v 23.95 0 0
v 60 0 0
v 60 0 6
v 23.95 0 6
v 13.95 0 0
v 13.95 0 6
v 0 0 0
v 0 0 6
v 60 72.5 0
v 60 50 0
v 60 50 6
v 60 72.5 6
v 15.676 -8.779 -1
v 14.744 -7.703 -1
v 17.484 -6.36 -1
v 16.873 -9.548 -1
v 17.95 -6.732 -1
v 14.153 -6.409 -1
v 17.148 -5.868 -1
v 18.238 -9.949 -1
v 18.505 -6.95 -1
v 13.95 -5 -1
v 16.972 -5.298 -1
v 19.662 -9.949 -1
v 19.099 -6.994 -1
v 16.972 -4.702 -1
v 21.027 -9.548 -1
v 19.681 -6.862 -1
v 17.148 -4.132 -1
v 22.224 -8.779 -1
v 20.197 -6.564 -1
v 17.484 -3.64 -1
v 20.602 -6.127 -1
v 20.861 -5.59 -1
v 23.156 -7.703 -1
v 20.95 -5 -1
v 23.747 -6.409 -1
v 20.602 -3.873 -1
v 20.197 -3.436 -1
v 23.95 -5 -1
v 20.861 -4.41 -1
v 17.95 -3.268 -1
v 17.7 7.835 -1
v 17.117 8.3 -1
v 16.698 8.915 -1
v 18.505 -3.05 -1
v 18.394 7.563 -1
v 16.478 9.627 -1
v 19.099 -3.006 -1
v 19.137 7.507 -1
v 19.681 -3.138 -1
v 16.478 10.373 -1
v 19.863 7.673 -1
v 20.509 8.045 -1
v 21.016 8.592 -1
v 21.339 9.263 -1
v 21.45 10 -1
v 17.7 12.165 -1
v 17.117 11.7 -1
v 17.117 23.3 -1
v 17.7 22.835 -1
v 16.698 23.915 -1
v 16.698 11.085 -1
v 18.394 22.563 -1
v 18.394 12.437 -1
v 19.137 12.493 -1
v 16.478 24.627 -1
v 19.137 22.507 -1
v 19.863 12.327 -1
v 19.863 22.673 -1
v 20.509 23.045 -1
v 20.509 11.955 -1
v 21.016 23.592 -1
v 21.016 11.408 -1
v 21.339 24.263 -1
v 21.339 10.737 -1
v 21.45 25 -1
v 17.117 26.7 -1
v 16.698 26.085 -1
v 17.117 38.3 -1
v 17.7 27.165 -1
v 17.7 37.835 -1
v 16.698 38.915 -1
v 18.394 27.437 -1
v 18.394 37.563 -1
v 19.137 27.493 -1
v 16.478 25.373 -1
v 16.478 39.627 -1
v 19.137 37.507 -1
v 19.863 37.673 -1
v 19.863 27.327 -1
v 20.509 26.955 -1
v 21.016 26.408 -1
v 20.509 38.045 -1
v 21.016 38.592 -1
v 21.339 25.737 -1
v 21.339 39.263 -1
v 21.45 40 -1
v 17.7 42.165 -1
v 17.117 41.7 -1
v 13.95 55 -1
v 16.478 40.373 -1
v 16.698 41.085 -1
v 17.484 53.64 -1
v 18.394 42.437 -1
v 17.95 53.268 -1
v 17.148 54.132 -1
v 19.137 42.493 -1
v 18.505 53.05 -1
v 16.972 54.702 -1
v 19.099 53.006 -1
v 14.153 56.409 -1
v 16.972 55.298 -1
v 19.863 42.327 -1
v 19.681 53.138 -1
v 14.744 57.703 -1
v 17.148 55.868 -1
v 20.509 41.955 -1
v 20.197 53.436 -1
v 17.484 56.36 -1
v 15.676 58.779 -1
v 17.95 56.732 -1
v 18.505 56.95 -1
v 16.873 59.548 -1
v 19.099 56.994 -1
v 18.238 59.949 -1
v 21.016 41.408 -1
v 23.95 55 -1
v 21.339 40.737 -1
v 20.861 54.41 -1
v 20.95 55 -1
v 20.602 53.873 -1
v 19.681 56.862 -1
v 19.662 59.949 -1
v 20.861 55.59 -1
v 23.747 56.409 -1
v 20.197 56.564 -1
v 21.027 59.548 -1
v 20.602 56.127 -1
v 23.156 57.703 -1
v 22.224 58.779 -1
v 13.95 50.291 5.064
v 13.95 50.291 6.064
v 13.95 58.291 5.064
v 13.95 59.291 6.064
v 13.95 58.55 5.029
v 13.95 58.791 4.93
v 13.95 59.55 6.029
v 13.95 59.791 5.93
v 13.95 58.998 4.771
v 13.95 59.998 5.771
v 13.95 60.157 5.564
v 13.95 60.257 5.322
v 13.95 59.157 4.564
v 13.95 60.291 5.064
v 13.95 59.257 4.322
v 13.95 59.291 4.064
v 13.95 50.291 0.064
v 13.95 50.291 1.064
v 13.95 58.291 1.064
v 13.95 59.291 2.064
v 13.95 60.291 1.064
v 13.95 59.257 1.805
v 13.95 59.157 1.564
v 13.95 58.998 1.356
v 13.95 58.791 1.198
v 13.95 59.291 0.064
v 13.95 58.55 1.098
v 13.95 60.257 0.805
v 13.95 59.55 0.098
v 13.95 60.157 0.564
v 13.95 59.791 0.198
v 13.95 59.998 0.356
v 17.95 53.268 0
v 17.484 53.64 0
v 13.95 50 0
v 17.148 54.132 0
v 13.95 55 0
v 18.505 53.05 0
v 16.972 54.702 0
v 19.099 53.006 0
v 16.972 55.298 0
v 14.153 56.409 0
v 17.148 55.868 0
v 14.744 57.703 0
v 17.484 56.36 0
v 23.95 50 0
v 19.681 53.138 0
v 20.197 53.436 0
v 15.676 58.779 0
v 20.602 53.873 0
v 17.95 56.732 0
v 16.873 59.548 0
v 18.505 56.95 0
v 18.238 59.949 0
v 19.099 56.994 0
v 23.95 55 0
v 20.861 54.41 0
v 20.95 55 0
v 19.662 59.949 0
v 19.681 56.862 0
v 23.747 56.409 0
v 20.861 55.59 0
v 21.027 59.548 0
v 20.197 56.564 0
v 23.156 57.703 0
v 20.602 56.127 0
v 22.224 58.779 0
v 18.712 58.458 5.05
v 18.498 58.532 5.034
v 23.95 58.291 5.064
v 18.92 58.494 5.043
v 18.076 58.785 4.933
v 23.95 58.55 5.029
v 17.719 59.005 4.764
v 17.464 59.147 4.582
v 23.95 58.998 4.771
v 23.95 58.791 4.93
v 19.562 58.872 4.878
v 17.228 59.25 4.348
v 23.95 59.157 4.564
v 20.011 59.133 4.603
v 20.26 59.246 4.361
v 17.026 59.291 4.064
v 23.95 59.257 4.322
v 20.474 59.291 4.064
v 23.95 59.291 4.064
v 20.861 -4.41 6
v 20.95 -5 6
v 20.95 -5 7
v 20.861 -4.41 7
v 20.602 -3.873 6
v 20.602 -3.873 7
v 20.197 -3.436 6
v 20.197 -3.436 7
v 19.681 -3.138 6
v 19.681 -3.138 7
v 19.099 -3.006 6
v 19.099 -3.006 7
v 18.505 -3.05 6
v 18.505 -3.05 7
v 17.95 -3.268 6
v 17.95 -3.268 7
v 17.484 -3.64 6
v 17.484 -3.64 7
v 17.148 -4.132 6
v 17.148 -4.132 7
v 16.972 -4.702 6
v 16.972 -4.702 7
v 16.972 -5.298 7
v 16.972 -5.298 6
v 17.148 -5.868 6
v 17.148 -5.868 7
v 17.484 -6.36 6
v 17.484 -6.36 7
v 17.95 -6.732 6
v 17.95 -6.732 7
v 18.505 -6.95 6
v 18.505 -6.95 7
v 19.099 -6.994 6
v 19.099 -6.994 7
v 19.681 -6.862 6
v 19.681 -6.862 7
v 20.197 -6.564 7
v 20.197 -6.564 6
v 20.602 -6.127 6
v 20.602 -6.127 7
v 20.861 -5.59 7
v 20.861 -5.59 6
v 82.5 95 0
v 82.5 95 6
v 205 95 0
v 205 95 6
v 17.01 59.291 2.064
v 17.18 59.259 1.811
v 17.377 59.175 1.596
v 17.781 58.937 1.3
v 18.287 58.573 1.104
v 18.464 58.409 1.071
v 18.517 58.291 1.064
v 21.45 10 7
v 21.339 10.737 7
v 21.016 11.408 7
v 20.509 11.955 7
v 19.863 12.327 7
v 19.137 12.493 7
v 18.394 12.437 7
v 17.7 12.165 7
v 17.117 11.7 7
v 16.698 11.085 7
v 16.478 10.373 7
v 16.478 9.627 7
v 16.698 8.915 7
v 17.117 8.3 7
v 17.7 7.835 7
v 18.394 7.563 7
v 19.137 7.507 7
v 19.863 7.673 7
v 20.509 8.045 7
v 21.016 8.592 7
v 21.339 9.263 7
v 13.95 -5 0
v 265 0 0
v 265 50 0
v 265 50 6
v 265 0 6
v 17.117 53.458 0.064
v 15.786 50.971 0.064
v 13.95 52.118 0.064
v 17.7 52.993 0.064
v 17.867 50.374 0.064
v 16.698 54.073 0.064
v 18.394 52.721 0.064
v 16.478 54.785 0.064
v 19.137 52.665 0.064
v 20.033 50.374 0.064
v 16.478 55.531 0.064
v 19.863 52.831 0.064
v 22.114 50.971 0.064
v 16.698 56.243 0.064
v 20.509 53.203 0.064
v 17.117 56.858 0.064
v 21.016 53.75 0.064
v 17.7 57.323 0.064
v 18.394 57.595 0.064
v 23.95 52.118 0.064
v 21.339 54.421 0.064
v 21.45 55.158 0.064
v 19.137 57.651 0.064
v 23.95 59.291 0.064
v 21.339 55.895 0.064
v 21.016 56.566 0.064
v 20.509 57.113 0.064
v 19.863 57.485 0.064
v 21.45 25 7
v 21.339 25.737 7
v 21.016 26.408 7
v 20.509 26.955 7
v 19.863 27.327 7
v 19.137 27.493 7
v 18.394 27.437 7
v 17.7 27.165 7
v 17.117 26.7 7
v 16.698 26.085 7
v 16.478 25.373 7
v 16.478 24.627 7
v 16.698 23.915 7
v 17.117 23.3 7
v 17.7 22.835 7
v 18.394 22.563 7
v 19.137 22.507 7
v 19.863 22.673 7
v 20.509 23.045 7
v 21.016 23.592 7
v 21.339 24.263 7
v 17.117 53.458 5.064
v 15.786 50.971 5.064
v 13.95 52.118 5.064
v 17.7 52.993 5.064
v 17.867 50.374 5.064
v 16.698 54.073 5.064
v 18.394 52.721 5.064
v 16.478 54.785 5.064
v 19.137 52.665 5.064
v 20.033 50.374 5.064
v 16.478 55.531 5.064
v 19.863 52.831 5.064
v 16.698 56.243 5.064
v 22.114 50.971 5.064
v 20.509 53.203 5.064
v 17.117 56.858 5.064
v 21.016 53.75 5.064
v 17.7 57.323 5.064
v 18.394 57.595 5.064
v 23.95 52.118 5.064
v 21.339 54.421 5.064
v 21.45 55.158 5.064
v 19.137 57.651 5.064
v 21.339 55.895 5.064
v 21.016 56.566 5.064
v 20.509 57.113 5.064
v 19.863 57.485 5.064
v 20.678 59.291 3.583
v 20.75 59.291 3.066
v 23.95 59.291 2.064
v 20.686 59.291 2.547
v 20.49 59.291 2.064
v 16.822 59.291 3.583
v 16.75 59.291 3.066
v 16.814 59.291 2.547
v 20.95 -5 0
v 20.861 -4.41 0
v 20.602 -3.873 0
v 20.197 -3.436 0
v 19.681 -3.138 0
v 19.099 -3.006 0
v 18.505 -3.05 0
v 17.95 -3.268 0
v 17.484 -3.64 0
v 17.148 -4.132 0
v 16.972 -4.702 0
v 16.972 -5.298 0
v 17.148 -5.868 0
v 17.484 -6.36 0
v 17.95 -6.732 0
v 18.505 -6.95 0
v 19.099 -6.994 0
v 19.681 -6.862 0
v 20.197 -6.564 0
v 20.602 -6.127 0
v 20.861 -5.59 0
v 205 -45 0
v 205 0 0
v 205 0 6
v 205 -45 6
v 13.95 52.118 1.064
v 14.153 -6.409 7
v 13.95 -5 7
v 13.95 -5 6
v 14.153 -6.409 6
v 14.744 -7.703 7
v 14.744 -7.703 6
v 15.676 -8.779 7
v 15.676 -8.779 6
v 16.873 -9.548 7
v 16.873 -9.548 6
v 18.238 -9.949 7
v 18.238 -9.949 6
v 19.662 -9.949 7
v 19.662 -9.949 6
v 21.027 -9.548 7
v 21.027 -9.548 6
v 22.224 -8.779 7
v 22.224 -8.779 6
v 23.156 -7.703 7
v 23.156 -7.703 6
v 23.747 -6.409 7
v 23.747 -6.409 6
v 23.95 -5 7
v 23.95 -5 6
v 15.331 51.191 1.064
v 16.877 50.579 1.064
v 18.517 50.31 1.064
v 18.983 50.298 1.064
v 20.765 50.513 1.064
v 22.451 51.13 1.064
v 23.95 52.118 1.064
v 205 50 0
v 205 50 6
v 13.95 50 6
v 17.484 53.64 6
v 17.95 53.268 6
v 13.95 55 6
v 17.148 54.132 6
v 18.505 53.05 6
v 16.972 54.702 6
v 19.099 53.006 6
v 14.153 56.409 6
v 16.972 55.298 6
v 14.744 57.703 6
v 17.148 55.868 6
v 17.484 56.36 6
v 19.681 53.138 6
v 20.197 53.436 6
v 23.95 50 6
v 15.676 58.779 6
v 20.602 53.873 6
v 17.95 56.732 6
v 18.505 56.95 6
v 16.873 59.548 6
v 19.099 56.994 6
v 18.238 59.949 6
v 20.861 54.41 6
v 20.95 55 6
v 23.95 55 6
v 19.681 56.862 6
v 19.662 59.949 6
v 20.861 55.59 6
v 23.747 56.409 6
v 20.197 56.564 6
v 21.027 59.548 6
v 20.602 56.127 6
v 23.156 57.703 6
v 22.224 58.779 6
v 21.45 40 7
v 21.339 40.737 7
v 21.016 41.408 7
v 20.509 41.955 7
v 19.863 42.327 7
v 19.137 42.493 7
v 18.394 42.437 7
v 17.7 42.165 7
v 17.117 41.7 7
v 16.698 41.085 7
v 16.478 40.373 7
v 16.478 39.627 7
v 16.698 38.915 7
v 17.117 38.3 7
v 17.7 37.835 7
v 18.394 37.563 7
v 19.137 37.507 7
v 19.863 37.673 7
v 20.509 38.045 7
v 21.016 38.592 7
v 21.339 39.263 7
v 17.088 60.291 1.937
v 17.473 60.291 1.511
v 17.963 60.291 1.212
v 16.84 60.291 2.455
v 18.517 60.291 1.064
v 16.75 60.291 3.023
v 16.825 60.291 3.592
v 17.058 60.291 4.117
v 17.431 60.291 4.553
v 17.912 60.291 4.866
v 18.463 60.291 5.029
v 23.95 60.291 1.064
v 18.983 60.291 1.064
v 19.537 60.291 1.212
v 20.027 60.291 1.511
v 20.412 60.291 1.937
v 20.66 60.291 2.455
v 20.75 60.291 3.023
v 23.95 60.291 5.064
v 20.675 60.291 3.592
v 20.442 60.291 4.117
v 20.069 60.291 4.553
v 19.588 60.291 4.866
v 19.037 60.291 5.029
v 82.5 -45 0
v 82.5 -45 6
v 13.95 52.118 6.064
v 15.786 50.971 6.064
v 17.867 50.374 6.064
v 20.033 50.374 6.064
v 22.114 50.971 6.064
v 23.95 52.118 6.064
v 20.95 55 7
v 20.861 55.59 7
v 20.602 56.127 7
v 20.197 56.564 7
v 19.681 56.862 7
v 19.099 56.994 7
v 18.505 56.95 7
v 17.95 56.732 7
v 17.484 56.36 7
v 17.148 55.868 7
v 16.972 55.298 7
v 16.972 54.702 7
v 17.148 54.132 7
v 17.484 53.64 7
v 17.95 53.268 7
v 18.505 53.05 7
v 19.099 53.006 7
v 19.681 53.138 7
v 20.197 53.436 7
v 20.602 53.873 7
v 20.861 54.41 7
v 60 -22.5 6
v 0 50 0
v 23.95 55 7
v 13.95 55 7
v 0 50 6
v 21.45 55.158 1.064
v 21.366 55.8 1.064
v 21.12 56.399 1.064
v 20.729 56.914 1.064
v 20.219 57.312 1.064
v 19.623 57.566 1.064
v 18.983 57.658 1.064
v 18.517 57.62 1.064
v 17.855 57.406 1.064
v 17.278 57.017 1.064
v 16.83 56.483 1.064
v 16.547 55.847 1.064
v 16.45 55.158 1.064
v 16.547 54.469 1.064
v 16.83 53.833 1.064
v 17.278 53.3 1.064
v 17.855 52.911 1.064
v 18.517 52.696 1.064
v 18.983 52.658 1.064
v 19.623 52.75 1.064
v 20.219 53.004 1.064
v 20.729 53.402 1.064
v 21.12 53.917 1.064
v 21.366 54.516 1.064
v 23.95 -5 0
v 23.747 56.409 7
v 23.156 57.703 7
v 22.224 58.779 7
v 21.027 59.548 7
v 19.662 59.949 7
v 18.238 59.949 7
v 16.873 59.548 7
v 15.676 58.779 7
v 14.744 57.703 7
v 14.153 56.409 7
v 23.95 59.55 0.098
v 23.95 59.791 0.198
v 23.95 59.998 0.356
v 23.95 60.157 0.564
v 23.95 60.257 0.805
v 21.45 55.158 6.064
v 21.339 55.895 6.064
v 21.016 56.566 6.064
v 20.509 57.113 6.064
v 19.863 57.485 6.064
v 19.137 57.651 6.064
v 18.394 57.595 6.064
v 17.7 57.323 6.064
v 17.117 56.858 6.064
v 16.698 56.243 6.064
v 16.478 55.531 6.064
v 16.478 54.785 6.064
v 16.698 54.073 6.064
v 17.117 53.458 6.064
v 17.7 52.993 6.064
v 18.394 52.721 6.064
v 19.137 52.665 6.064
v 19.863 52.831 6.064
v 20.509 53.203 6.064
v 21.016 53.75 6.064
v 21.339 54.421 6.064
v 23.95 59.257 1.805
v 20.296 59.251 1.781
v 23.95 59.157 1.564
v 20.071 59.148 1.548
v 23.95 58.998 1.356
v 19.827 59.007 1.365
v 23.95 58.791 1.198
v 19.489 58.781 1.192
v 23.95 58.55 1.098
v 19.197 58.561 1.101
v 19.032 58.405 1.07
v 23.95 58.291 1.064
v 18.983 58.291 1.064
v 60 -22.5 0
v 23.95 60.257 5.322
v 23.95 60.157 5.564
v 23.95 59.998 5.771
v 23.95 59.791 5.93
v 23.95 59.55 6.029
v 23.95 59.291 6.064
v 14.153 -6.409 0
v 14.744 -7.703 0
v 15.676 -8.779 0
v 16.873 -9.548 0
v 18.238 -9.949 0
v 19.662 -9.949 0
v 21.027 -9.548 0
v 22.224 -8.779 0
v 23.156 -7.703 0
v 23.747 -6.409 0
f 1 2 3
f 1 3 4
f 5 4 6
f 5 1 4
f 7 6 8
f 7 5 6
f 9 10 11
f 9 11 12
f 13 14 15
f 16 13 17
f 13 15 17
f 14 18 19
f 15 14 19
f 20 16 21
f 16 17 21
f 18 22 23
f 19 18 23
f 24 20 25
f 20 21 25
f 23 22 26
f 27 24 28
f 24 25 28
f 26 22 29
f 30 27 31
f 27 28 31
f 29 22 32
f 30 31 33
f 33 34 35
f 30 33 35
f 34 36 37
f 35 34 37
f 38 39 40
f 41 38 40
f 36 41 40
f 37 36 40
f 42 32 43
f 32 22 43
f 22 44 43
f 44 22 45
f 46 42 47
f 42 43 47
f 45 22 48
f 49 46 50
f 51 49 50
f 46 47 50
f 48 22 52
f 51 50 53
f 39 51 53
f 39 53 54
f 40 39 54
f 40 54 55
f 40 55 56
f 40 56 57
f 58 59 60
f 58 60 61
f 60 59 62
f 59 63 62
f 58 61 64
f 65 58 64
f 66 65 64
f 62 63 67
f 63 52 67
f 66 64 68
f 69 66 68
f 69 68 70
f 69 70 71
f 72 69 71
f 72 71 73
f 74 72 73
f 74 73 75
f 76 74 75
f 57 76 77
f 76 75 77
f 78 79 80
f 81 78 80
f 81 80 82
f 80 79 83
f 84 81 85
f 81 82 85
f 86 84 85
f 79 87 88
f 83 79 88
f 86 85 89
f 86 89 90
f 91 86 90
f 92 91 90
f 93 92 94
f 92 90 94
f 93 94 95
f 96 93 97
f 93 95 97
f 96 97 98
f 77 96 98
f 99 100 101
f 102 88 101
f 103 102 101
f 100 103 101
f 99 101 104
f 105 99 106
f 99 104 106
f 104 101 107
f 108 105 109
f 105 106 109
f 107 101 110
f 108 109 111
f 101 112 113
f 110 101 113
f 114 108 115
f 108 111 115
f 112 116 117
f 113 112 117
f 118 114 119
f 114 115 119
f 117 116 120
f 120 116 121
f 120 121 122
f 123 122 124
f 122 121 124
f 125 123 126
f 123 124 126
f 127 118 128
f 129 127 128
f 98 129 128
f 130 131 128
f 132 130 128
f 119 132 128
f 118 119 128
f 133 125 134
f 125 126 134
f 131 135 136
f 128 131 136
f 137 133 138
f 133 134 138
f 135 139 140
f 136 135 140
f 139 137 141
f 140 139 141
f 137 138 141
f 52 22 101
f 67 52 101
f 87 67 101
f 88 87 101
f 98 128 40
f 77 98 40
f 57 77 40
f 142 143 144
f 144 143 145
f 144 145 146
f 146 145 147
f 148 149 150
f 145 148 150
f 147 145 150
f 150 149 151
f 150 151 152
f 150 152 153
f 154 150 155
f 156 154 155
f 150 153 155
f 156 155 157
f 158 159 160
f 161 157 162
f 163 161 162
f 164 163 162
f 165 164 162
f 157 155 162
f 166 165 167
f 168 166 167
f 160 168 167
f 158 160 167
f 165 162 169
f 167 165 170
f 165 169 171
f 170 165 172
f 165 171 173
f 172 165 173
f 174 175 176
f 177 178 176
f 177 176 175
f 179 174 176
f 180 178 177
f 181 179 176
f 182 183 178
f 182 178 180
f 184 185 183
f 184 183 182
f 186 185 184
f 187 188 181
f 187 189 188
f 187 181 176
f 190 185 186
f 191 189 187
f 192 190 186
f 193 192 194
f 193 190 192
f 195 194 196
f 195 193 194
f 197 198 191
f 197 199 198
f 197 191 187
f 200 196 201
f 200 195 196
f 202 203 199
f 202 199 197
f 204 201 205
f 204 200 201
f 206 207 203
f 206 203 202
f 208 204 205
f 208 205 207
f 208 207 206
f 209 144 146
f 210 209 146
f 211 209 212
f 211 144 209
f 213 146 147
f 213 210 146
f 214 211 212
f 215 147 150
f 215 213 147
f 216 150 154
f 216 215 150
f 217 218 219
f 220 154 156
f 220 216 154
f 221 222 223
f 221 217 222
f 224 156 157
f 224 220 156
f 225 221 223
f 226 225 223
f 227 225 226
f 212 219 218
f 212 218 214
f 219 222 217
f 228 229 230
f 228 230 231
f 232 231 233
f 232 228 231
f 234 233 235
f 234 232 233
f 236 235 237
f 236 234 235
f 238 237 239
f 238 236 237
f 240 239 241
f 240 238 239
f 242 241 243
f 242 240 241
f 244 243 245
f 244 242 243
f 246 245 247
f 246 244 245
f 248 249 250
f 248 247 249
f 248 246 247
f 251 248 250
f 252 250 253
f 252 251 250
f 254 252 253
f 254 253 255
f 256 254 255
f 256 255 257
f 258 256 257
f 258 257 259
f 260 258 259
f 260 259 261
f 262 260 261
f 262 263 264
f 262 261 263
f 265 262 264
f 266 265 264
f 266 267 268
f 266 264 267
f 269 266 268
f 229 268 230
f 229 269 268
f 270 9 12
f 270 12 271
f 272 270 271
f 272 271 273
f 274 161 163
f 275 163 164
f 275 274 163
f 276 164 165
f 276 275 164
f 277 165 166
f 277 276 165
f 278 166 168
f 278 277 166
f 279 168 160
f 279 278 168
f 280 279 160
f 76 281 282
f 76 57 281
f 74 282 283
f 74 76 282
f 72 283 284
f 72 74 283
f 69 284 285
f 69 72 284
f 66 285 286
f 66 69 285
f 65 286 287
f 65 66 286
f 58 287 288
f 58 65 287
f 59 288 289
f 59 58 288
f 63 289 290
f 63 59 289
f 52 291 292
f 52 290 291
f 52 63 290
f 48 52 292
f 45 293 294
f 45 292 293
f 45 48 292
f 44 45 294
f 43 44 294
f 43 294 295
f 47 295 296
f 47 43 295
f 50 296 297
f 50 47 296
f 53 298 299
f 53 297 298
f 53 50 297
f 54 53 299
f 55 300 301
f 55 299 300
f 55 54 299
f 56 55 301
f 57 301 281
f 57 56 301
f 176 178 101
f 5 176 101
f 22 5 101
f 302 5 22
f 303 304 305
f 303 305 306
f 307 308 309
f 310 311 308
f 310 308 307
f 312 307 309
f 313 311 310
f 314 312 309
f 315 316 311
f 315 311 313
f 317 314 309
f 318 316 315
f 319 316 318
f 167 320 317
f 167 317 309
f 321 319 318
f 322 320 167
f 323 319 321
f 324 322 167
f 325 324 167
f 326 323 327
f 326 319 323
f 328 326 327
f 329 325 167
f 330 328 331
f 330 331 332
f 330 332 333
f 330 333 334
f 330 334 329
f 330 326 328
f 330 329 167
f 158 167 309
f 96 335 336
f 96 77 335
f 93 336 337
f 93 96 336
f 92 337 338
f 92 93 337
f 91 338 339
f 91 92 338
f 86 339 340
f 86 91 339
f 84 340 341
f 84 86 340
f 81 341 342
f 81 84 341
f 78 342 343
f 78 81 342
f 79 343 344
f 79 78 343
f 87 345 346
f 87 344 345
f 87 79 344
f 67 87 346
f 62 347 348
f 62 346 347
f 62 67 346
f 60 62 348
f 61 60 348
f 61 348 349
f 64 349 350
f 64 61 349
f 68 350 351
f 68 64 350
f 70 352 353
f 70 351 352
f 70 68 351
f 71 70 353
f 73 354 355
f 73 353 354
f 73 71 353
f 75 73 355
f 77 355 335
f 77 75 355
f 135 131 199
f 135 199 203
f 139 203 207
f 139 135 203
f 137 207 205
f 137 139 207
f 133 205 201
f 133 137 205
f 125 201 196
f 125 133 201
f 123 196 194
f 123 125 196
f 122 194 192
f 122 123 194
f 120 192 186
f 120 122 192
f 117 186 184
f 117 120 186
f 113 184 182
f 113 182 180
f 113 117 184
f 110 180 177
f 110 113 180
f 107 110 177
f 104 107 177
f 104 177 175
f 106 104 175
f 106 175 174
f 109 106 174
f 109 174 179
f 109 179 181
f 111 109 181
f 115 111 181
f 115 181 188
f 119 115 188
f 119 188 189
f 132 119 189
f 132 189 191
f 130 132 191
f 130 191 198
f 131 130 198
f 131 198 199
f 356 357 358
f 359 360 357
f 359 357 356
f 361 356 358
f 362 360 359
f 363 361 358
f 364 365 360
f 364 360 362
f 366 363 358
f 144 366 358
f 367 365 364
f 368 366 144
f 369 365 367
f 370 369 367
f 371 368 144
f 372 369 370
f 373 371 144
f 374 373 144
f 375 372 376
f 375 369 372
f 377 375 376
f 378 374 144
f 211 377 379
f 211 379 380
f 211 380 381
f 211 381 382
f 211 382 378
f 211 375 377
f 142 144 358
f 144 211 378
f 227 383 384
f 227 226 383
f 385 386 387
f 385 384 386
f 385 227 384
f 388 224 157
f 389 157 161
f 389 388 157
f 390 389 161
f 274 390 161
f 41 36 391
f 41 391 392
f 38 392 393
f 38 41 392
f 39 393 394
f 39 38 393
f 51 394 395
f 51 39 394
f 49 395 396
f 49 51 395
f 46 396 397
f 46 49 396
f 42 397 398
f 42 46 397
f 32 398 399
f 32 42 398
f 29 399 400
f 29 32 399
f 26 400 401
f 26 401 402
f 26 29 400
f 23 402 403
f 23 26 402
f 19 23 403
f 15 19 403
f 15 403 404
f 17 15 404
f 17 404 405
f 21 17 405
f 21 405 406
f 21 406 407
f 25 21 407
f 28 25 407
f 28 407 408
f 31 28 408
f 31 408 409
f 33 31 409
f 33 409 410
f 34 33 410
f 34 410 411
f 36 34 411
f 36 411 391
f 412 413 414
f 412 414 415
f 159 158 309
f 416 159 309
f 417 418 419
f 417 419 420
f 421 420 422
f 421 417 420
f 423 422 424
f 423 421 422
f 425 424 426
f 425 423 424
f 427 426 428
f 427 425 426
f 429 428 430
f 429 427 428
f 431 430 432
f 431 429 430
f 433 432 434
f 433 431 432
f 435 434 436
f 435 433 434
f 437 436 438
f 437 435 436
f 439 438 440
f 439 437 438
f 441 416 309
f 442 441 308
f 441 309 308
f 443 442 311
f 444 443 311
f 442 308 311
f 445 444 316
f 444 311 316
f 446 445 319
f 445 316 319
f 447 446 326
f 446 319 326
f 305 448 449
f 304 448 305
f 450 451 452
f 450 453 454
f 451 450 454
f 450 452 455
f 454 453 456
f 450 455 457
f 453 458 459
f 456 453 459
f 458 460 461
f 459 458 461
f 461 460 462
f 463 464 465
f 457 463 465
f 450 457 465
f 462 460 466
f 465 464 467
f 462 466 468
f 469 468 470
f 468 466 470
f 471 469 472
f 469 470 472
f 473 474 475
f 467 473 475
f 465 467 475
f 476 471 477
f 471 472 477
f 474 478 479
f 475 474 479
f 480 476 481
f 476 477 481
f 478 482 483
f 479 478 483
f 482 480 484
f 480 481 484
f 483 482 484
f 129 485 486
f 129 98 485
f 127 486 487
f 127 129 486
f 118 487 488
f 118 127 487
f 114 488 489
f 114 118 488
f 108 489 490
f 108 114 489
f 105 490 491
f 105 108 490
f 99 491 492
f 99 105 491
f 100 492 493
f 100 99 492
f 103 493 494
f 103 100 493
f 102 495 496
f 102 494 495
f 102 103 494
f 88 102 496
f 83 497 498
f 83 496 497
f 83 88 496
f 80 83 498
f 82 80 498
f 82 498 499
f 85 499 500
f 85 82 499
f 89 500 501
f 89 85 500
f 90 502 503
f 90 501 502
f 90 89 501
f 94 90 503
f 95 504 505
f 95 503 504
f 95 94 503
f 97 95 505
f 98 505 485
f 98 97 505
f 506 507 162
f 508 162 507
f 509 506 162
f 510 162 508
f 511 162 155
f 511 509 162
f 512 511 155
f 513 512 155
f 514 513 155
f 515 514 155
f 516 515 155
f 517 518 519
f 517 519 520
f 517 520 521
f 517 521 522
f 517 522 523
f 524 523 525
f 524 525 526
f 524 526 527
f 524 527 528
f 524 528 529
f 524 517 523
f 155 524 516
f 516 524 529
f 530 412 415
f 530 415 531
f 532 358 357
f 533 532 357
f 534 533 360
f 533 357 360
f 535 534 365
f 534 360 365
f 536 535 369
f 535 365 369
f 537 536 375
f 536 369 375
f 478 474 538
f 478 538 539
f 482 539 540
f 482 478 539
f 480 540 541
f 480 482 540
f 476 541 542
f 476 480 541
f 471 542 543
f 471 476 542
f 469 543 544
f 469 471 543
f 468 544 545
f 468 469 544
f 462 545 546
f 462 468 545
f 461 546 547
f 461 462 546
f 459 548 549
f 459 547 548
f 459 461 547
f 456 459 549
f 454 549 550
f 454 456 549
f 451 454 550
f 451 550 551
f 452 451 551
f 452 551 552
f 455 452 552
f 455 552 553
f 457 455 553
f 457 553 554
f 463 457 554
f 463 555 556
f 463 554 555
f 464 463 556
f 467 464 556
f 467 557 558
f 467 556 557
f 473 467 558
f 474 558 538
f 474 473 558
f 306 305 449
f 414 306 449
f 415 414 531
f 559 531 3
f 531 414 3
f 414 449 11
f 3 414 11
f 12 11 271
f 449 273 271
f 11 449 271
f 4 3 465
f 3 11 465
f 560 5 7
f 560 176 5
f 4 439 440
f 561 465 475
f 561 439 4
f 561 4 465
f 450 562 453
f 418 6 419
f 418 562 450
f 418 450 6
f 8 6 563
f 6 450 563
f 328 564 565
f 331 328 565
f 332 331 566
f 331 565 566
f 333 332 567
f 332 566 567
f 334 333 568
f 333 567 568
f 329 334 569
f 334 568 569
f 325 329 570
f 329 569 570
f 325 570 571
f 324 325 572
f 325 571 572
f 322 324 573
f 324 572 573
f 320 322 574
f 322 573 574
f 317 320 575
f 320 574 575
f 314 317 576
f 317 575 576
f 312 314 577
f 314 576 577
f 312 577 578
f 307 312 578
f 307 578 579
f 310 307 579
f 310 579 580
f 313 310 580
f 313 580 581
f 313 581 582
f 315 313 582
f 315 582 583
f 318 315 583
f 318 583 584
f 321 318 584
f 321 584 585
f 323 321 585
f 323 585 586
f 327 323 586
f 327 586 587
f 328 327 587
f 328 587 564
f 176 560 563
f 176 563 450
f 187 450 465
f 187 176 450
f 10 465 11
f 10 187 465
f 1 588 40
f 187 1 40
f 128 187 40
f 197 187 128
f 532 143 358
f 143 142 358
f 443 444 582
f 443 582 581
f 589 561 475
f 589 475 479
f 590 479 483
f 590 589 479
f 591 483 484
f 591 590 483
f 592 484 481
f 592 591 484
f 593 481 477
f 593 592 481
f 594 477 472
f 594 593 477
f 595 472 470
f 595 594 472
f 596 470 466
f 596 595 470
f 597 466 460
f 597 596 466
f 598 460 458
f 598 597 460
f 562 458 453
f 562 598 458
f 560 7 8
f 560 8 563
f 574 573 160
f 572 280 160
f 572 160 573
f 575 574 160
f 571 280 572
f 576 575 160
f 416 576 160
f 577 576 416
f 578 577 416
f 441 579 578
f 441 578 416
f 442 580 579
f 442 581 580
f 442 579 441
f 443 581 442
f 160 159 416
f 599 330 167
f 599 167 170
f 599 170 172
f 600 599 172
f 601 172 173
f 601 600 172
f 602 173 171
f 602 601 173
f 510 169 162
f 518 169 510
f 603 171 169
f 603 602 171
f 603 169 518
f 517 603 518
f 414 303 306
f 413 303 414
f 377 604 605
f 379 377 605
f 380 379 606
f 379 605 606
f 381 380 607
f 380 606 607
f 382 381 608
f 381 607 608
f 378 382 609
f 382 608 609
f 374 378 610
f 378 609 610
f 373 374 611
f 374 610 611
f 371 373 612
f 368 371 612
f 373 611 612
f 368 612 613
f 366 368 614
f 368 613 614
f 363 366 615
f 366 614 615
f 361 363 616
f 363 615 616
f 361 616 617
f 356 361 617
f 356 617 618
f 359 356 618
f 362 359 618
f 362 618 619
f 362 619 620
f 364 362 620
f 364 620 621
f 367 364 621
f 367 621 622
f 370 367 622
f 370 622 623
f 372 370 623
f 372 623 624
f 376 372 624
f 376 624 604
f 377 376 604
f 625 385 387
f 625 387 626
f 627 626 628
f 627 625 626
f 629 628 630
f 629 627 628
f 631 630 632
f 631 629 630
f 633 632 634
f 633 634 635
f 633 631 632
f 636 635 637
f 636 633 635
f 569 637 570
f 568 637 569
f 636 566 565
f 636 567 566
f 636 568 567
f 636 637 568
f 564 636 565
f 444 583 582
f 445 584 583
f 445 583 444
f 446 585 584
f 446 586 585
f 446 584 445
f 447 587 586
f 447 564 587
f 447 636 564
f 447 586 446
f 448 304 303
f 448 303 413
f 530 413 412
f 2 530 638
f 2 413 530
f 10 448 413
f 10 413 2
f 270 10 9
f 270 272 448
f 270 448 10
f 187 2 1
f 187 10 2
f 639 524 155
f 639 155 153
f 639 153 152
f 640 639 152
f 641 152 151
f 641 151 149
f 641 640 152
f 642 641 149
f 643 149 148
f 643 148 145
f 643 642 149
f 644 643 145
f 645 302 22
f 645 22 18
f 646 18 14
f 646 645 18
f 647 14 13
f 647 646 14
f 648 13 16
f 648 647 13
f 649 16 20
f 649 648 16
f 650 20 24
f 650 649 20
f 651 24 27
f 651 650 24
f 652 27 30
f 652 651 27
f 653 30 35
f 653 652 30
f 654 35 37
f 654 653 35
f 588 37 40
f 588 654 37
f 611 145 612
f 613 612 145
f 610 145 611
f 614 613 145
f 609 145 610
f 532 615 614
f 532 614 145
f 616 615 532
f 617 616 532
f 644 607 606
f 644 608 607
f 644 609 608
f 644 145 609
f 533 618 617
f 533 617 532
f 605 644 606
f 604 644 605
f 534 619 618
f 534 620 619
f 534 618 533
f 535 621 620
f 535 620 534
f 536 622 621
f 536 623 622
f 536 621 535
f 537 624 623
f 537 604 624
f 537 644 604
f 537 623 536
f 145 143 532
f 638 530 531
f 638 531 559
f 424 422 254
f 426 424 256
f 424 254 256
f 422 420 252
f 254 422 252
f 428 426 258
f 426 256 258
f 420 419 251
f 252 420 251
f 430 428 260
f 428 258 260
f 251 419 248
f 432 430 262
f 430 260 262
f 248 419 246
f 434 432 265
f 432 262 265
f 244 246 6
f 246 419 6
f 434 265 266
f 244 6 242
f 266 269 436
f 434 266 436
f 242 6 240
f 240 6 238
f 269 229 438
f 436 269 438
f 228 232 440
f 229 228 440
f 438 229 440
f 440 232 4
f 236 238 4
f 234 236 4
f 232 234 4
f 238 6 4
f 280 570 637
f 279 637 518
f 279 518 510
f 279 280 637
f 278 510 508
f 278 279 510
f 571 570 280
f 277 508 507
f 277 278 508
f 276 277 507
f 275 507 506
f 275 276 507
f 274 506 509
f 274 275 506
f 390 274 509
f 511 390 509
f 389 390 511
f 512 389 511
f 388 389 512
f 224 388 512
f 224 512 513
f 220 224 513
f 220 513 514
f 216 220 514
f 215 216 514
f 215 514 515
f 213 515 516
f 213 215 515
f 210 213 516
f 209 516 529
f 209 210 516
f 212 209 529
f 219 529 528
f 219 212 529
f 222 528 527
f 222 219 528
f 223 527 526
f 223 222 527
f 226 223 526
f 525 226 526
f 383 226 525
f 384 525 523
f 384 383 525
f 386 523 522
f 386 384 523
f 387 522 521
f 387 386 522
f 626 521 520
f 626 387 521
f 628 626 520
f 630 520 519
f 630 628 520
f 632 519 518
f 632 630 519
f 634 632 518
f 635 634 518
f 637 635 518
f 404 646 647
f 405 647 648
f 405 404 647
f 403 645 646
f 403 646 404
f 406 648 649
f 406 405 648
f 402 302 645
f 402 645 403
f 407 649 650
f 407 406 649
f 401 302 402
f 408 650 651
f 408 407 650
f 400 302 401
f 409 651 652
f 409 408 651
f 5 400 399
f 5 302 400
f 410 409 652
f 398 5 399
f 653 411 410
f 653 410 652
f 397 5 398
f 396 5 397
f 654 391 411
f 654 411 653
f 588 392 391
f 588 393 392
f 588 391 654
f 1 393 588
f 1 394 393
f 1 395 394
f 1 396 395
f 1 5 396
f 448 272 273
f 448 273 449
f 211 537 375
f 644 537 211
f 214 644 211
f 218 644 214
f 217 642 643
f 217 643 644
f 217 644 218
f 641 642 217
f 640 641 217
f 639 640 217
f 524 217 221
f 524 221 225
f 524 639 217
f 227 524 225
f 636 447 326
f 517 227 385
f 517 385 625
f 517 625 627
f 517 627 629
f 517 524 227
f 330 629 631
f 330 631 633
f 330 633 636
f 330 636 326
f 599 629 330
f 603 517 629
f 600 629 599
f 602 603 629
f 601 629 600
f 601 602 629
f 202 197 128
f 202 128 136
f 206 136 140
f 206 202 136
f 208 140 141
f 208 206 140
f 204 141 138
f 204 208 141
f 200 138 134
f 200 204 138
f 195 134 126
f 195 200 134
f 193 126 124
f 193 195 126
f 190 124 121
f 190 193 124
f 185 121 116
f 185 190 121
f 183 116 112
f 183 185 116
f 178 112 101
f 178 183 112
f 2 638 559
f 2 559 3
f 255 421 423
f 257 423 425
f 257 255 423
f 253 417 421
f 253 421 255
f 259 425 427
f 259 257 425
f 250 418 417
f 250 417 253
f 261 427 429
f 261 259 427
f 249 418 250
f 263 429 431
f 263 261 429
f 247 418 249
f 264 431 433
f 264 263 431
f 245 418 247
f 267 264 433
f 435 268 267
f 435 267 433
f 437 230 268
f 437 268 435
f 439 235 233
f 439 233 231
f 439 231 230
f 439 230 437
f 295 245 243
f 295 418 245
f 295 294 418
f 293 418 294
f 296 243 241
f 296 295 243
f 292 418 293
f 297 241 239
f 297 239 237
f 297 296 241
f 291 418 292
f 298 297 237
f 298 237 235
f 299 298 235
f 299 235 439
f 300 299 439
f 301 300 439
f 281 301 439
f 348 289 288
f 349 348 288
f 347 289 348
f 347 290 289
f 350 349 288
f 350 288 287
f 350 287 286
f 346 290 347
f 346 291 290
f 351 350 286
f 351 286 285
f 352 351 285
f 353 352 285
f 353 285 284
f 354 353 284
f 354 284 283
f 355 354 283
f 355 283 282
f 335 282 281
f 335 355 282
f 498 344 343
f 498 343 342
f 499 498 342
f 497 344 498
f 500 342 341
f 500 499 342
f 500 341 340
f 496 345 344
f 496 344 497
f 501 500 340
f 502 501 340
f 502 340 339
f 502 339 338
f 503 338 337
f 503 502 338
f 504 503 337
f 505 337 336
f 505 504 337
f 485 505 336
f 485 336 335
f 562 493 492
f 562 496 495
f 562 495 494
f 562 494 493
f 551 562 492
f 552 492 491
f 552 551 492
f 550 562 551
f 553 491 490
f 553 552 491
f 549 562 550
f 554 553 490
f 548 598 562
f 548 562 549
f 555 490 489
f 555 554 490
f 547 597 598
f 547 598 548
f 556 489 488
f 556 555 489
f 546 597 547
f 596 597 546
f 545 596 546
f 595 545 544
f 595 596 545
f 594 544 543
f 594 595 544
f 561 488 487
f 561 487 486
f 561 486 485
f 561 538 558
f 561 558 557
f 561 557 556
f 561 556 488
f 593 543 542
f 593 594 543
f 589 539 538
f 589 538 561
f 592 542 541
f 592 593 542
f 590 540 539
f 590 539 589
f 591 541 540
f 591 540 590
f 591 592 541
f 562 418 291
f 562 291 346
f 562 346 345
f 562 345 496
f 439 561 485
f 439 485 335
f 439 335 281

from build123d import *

# Parameters (mm, degrees)
EXTRUDE_2_DEPTH        = 6
EXTRUDE_3_DEPTH        = 1
PATTERN_LINEAR_1_COUNT = 2
PATTERN_LINEAR_1_PITCH = 7
SKETCH_12_2_R          = 2
SKETCH_12_2_R_2        = 2.5
CUT_EXTRUDE_2_DEPTH    = 31
CUT_EXTRUDE_START      = -31
SKETCH_12_3_R          = 2
SKETCH_12_3_R_2        = 2.5
CUT_EXTRUDE_3_DEPTH    = 31
EXTRUDE_4_DEPTH        = 0.0001
EXTRUDE_4_DEPTH_BACK   = 10
SKETCH_15_6_R          = 2.5
CUT_EXTRUDE_21_DEPTH   = 30
CUT_EXTRUDE_25_DEPTH   = 30
SKETCH_37_R            = 2
CUT_EXTRUDE_28_DEPTH   = 150


with BuildPart() as part:
    # Эскиз4<2> → Бобышка-Вытянуть2 (new body)
    with BuildSketch(Plane.XY):
        Polygon((0, 0), (0, 50), (60, 50), (60, 72.5), (82.5, 95), (205, 95), (205, 50), (265, 50), (265, 0), (205, 0), (205, -45), (82.5, -45), (60, -22.5), (60, 0), align=None)
    extrude(amount=EXTRUDE_2_DEPTH)

    # Эскиз7<2> → Бобышка-Вытянуть3 (add)
    with BuildSketch(Plane.XY):
        with BuildLine():
            Line((13.95, 55), (13.95, -5))
            ThreePointArc((13.95, -5), (18.95, -10), (23.95, -5))
            Line((23.95, -5), (23.95, 55))
            ThreePointArc((23.95, 55), (18.95, 60), (13.95, 55))
        make_face()
    extrude_3 = extrude(amount=-EXTRUDE_3_DEPTH)

    # Линейный массив1: Бобышка-Вытянуть3 ×2
    with Locations(*[(0, 0, i * PATTERN_LINEAR_1_PITCH) for i in range(1, PATTERN_LINEAR_1_COUNT)]):
        add(extrude_3)

    # Эскиз12<2> → Вырез-Вытянуть2 (cut)
    with BuildSketch(Plane.XY):
        with Locations((18.95, 55)):
            Circle(SKETCH_12_2_R)
        with Locations((18.95, 25)):
            Circle(SKETCH_12_2_R_2)
        with Locations((18.95, 10)):
            Circle(SKETCH_12_2_R_2)
        with Locations((18.95, -5)):
            Circle(SKETCH_12_2_R)
        with Locations((18.95, 40)):
            Circle(SKETCH_12_2_R_2)
    extrude(amount=CUT_EXTRUDE_2_DEPTH, mode=Mode.SUBTRACT)

    # Эскиз12<3> → Вырез-Вытянуть3 (cut)
    with BuildSketch(Plane.XY.offset(CUT_EXTRUDE_START)):
        with Locations((18.95, 55)):
            Circle(SKETCH_12_3_R)
        with Locations((18.95, 40)):
            Circle(SKETCH_12_3_R_2)
        with Locations((18.95, 25)):
            Circle(SKETCH_12_3_R_2)
        with Locations((18.95, 10)):
            Circle(SKETCH_12_3_R_2)
        with Locations((18.95, -5)):
            Circle(SKETCH_12_3_R)
    extrude(amount=CUT_EXTRUDE_3_DEPTH, mode=Mode.SUBTRACT)


with BuildPart() as body_2:
    # Эскиз14 → Бобышка-Вытянуть4 (new, two sides: drawn at the far end of the back side and taken through both)
    with BuildSketch(Plane(origin=(13.95, 61.855423186, -9.080381405), x_dir=(0, 0, 1), z_dir=(-1, 0, 0)).offset(-EXTRUDE_4_DEPTH_BACK)):
        with BuildLine():
            Line((9.143949682, -11.564188361), (9.143949682, -6.564188361))
            Line((9.143949682, -6.564188361), (9.143949682, -2.564188361))
            ThreePointArc((9.143949682, -2.564188361), (9.4368429, -1.85708158), (10.143949682, -1.564188361))
            Line((10.143949682, -1.564188361), (14.143949682, -1.564188361))
            ThreePointArc((14.143949682, -1.564188361), (14.851056463, -1.85708158), (15.143949682, -2.564188361))
            Line((15.143949682, -2.564188361), (15.143949682, -11.564188361))
            Line((15.143949682, -11.564188361), (14.143949682, -11.564188361))
            Line((14.143949682, -11.564188361), (14.143949682, -3.564188361))
            ThreePointArc((14.143949682, -3.564188361), (13.851056463, -2.85708158), (13.143949682, -2.564188361))
            Line((13.143949682, -2.564188361), (11.143949682, -2.564188361))
            ThreePointArc((11.143949682, -2.564188361), (10.4368429, -2.85708158), (10.143949682, -3.564188361))
            Line((10.143949682, -3.564188361), (10.143949682, -11.564188361))
            Line((10.143949682, -11.564188361), (9.143949682, -11.564188361))
        make_face()
    extrude(amount=EXTRUDE_4_DEPTH + EXTRUDE_4_DEPTH_BACK)

    # Эскиз15<6> → Вырез-Вытянуть21 (cut)
    with BuildSketch(Plane(origin=(13.95, 55.158060944, 6.063568276), x_dir=(1, 0, 0), z_dir=(0, 0, 1))):
        with Locations((5, 0)):
            Circle(SKETCH_15_6_R)
    extrude(amount=-CUT_EXTRUDE_21_DEPTH, mode=Mode.SUBTRACT)

    # Эскиз36 → Вырез-Вытянуть25 (cut)
    with BuildSketch(Plane.XY):
        with BuildLine():
            Line((13.95, 50.118842572), (13.95, 52.117785958))
            ThreePointArc((13.95, 52.117785958), (18.95, 50.298109491), (23.95, 52.117785958))
            Line((23.95, 52.117785958), (23.95, 50.118842572))
            Line((23.95, 50.118842572), (13.95, 50.118842572))
        make_face()
    extrude(amount=CUT_EXTRUDE_25_DEPTH, mode=Mode.SUBTRACT)

    # Эскиз37 → Вырез-Вытянуть28 (cut)
    with BuildSketch(Plane(origin=(0, 0, 0), x_dir=(1, 0, 0), z_dir=(0, 1, 0))):
        with Locations(Location((18.75, -3.05, 0), (0, 0, 83.322240049))):
            Circle(SKETCH_37_R)
    extrude(amount=CUT_EXTRUDE_28_DEPTH, mode=Mode.SUBTRACT)


solid = Compound([part.part, body_2.part])
